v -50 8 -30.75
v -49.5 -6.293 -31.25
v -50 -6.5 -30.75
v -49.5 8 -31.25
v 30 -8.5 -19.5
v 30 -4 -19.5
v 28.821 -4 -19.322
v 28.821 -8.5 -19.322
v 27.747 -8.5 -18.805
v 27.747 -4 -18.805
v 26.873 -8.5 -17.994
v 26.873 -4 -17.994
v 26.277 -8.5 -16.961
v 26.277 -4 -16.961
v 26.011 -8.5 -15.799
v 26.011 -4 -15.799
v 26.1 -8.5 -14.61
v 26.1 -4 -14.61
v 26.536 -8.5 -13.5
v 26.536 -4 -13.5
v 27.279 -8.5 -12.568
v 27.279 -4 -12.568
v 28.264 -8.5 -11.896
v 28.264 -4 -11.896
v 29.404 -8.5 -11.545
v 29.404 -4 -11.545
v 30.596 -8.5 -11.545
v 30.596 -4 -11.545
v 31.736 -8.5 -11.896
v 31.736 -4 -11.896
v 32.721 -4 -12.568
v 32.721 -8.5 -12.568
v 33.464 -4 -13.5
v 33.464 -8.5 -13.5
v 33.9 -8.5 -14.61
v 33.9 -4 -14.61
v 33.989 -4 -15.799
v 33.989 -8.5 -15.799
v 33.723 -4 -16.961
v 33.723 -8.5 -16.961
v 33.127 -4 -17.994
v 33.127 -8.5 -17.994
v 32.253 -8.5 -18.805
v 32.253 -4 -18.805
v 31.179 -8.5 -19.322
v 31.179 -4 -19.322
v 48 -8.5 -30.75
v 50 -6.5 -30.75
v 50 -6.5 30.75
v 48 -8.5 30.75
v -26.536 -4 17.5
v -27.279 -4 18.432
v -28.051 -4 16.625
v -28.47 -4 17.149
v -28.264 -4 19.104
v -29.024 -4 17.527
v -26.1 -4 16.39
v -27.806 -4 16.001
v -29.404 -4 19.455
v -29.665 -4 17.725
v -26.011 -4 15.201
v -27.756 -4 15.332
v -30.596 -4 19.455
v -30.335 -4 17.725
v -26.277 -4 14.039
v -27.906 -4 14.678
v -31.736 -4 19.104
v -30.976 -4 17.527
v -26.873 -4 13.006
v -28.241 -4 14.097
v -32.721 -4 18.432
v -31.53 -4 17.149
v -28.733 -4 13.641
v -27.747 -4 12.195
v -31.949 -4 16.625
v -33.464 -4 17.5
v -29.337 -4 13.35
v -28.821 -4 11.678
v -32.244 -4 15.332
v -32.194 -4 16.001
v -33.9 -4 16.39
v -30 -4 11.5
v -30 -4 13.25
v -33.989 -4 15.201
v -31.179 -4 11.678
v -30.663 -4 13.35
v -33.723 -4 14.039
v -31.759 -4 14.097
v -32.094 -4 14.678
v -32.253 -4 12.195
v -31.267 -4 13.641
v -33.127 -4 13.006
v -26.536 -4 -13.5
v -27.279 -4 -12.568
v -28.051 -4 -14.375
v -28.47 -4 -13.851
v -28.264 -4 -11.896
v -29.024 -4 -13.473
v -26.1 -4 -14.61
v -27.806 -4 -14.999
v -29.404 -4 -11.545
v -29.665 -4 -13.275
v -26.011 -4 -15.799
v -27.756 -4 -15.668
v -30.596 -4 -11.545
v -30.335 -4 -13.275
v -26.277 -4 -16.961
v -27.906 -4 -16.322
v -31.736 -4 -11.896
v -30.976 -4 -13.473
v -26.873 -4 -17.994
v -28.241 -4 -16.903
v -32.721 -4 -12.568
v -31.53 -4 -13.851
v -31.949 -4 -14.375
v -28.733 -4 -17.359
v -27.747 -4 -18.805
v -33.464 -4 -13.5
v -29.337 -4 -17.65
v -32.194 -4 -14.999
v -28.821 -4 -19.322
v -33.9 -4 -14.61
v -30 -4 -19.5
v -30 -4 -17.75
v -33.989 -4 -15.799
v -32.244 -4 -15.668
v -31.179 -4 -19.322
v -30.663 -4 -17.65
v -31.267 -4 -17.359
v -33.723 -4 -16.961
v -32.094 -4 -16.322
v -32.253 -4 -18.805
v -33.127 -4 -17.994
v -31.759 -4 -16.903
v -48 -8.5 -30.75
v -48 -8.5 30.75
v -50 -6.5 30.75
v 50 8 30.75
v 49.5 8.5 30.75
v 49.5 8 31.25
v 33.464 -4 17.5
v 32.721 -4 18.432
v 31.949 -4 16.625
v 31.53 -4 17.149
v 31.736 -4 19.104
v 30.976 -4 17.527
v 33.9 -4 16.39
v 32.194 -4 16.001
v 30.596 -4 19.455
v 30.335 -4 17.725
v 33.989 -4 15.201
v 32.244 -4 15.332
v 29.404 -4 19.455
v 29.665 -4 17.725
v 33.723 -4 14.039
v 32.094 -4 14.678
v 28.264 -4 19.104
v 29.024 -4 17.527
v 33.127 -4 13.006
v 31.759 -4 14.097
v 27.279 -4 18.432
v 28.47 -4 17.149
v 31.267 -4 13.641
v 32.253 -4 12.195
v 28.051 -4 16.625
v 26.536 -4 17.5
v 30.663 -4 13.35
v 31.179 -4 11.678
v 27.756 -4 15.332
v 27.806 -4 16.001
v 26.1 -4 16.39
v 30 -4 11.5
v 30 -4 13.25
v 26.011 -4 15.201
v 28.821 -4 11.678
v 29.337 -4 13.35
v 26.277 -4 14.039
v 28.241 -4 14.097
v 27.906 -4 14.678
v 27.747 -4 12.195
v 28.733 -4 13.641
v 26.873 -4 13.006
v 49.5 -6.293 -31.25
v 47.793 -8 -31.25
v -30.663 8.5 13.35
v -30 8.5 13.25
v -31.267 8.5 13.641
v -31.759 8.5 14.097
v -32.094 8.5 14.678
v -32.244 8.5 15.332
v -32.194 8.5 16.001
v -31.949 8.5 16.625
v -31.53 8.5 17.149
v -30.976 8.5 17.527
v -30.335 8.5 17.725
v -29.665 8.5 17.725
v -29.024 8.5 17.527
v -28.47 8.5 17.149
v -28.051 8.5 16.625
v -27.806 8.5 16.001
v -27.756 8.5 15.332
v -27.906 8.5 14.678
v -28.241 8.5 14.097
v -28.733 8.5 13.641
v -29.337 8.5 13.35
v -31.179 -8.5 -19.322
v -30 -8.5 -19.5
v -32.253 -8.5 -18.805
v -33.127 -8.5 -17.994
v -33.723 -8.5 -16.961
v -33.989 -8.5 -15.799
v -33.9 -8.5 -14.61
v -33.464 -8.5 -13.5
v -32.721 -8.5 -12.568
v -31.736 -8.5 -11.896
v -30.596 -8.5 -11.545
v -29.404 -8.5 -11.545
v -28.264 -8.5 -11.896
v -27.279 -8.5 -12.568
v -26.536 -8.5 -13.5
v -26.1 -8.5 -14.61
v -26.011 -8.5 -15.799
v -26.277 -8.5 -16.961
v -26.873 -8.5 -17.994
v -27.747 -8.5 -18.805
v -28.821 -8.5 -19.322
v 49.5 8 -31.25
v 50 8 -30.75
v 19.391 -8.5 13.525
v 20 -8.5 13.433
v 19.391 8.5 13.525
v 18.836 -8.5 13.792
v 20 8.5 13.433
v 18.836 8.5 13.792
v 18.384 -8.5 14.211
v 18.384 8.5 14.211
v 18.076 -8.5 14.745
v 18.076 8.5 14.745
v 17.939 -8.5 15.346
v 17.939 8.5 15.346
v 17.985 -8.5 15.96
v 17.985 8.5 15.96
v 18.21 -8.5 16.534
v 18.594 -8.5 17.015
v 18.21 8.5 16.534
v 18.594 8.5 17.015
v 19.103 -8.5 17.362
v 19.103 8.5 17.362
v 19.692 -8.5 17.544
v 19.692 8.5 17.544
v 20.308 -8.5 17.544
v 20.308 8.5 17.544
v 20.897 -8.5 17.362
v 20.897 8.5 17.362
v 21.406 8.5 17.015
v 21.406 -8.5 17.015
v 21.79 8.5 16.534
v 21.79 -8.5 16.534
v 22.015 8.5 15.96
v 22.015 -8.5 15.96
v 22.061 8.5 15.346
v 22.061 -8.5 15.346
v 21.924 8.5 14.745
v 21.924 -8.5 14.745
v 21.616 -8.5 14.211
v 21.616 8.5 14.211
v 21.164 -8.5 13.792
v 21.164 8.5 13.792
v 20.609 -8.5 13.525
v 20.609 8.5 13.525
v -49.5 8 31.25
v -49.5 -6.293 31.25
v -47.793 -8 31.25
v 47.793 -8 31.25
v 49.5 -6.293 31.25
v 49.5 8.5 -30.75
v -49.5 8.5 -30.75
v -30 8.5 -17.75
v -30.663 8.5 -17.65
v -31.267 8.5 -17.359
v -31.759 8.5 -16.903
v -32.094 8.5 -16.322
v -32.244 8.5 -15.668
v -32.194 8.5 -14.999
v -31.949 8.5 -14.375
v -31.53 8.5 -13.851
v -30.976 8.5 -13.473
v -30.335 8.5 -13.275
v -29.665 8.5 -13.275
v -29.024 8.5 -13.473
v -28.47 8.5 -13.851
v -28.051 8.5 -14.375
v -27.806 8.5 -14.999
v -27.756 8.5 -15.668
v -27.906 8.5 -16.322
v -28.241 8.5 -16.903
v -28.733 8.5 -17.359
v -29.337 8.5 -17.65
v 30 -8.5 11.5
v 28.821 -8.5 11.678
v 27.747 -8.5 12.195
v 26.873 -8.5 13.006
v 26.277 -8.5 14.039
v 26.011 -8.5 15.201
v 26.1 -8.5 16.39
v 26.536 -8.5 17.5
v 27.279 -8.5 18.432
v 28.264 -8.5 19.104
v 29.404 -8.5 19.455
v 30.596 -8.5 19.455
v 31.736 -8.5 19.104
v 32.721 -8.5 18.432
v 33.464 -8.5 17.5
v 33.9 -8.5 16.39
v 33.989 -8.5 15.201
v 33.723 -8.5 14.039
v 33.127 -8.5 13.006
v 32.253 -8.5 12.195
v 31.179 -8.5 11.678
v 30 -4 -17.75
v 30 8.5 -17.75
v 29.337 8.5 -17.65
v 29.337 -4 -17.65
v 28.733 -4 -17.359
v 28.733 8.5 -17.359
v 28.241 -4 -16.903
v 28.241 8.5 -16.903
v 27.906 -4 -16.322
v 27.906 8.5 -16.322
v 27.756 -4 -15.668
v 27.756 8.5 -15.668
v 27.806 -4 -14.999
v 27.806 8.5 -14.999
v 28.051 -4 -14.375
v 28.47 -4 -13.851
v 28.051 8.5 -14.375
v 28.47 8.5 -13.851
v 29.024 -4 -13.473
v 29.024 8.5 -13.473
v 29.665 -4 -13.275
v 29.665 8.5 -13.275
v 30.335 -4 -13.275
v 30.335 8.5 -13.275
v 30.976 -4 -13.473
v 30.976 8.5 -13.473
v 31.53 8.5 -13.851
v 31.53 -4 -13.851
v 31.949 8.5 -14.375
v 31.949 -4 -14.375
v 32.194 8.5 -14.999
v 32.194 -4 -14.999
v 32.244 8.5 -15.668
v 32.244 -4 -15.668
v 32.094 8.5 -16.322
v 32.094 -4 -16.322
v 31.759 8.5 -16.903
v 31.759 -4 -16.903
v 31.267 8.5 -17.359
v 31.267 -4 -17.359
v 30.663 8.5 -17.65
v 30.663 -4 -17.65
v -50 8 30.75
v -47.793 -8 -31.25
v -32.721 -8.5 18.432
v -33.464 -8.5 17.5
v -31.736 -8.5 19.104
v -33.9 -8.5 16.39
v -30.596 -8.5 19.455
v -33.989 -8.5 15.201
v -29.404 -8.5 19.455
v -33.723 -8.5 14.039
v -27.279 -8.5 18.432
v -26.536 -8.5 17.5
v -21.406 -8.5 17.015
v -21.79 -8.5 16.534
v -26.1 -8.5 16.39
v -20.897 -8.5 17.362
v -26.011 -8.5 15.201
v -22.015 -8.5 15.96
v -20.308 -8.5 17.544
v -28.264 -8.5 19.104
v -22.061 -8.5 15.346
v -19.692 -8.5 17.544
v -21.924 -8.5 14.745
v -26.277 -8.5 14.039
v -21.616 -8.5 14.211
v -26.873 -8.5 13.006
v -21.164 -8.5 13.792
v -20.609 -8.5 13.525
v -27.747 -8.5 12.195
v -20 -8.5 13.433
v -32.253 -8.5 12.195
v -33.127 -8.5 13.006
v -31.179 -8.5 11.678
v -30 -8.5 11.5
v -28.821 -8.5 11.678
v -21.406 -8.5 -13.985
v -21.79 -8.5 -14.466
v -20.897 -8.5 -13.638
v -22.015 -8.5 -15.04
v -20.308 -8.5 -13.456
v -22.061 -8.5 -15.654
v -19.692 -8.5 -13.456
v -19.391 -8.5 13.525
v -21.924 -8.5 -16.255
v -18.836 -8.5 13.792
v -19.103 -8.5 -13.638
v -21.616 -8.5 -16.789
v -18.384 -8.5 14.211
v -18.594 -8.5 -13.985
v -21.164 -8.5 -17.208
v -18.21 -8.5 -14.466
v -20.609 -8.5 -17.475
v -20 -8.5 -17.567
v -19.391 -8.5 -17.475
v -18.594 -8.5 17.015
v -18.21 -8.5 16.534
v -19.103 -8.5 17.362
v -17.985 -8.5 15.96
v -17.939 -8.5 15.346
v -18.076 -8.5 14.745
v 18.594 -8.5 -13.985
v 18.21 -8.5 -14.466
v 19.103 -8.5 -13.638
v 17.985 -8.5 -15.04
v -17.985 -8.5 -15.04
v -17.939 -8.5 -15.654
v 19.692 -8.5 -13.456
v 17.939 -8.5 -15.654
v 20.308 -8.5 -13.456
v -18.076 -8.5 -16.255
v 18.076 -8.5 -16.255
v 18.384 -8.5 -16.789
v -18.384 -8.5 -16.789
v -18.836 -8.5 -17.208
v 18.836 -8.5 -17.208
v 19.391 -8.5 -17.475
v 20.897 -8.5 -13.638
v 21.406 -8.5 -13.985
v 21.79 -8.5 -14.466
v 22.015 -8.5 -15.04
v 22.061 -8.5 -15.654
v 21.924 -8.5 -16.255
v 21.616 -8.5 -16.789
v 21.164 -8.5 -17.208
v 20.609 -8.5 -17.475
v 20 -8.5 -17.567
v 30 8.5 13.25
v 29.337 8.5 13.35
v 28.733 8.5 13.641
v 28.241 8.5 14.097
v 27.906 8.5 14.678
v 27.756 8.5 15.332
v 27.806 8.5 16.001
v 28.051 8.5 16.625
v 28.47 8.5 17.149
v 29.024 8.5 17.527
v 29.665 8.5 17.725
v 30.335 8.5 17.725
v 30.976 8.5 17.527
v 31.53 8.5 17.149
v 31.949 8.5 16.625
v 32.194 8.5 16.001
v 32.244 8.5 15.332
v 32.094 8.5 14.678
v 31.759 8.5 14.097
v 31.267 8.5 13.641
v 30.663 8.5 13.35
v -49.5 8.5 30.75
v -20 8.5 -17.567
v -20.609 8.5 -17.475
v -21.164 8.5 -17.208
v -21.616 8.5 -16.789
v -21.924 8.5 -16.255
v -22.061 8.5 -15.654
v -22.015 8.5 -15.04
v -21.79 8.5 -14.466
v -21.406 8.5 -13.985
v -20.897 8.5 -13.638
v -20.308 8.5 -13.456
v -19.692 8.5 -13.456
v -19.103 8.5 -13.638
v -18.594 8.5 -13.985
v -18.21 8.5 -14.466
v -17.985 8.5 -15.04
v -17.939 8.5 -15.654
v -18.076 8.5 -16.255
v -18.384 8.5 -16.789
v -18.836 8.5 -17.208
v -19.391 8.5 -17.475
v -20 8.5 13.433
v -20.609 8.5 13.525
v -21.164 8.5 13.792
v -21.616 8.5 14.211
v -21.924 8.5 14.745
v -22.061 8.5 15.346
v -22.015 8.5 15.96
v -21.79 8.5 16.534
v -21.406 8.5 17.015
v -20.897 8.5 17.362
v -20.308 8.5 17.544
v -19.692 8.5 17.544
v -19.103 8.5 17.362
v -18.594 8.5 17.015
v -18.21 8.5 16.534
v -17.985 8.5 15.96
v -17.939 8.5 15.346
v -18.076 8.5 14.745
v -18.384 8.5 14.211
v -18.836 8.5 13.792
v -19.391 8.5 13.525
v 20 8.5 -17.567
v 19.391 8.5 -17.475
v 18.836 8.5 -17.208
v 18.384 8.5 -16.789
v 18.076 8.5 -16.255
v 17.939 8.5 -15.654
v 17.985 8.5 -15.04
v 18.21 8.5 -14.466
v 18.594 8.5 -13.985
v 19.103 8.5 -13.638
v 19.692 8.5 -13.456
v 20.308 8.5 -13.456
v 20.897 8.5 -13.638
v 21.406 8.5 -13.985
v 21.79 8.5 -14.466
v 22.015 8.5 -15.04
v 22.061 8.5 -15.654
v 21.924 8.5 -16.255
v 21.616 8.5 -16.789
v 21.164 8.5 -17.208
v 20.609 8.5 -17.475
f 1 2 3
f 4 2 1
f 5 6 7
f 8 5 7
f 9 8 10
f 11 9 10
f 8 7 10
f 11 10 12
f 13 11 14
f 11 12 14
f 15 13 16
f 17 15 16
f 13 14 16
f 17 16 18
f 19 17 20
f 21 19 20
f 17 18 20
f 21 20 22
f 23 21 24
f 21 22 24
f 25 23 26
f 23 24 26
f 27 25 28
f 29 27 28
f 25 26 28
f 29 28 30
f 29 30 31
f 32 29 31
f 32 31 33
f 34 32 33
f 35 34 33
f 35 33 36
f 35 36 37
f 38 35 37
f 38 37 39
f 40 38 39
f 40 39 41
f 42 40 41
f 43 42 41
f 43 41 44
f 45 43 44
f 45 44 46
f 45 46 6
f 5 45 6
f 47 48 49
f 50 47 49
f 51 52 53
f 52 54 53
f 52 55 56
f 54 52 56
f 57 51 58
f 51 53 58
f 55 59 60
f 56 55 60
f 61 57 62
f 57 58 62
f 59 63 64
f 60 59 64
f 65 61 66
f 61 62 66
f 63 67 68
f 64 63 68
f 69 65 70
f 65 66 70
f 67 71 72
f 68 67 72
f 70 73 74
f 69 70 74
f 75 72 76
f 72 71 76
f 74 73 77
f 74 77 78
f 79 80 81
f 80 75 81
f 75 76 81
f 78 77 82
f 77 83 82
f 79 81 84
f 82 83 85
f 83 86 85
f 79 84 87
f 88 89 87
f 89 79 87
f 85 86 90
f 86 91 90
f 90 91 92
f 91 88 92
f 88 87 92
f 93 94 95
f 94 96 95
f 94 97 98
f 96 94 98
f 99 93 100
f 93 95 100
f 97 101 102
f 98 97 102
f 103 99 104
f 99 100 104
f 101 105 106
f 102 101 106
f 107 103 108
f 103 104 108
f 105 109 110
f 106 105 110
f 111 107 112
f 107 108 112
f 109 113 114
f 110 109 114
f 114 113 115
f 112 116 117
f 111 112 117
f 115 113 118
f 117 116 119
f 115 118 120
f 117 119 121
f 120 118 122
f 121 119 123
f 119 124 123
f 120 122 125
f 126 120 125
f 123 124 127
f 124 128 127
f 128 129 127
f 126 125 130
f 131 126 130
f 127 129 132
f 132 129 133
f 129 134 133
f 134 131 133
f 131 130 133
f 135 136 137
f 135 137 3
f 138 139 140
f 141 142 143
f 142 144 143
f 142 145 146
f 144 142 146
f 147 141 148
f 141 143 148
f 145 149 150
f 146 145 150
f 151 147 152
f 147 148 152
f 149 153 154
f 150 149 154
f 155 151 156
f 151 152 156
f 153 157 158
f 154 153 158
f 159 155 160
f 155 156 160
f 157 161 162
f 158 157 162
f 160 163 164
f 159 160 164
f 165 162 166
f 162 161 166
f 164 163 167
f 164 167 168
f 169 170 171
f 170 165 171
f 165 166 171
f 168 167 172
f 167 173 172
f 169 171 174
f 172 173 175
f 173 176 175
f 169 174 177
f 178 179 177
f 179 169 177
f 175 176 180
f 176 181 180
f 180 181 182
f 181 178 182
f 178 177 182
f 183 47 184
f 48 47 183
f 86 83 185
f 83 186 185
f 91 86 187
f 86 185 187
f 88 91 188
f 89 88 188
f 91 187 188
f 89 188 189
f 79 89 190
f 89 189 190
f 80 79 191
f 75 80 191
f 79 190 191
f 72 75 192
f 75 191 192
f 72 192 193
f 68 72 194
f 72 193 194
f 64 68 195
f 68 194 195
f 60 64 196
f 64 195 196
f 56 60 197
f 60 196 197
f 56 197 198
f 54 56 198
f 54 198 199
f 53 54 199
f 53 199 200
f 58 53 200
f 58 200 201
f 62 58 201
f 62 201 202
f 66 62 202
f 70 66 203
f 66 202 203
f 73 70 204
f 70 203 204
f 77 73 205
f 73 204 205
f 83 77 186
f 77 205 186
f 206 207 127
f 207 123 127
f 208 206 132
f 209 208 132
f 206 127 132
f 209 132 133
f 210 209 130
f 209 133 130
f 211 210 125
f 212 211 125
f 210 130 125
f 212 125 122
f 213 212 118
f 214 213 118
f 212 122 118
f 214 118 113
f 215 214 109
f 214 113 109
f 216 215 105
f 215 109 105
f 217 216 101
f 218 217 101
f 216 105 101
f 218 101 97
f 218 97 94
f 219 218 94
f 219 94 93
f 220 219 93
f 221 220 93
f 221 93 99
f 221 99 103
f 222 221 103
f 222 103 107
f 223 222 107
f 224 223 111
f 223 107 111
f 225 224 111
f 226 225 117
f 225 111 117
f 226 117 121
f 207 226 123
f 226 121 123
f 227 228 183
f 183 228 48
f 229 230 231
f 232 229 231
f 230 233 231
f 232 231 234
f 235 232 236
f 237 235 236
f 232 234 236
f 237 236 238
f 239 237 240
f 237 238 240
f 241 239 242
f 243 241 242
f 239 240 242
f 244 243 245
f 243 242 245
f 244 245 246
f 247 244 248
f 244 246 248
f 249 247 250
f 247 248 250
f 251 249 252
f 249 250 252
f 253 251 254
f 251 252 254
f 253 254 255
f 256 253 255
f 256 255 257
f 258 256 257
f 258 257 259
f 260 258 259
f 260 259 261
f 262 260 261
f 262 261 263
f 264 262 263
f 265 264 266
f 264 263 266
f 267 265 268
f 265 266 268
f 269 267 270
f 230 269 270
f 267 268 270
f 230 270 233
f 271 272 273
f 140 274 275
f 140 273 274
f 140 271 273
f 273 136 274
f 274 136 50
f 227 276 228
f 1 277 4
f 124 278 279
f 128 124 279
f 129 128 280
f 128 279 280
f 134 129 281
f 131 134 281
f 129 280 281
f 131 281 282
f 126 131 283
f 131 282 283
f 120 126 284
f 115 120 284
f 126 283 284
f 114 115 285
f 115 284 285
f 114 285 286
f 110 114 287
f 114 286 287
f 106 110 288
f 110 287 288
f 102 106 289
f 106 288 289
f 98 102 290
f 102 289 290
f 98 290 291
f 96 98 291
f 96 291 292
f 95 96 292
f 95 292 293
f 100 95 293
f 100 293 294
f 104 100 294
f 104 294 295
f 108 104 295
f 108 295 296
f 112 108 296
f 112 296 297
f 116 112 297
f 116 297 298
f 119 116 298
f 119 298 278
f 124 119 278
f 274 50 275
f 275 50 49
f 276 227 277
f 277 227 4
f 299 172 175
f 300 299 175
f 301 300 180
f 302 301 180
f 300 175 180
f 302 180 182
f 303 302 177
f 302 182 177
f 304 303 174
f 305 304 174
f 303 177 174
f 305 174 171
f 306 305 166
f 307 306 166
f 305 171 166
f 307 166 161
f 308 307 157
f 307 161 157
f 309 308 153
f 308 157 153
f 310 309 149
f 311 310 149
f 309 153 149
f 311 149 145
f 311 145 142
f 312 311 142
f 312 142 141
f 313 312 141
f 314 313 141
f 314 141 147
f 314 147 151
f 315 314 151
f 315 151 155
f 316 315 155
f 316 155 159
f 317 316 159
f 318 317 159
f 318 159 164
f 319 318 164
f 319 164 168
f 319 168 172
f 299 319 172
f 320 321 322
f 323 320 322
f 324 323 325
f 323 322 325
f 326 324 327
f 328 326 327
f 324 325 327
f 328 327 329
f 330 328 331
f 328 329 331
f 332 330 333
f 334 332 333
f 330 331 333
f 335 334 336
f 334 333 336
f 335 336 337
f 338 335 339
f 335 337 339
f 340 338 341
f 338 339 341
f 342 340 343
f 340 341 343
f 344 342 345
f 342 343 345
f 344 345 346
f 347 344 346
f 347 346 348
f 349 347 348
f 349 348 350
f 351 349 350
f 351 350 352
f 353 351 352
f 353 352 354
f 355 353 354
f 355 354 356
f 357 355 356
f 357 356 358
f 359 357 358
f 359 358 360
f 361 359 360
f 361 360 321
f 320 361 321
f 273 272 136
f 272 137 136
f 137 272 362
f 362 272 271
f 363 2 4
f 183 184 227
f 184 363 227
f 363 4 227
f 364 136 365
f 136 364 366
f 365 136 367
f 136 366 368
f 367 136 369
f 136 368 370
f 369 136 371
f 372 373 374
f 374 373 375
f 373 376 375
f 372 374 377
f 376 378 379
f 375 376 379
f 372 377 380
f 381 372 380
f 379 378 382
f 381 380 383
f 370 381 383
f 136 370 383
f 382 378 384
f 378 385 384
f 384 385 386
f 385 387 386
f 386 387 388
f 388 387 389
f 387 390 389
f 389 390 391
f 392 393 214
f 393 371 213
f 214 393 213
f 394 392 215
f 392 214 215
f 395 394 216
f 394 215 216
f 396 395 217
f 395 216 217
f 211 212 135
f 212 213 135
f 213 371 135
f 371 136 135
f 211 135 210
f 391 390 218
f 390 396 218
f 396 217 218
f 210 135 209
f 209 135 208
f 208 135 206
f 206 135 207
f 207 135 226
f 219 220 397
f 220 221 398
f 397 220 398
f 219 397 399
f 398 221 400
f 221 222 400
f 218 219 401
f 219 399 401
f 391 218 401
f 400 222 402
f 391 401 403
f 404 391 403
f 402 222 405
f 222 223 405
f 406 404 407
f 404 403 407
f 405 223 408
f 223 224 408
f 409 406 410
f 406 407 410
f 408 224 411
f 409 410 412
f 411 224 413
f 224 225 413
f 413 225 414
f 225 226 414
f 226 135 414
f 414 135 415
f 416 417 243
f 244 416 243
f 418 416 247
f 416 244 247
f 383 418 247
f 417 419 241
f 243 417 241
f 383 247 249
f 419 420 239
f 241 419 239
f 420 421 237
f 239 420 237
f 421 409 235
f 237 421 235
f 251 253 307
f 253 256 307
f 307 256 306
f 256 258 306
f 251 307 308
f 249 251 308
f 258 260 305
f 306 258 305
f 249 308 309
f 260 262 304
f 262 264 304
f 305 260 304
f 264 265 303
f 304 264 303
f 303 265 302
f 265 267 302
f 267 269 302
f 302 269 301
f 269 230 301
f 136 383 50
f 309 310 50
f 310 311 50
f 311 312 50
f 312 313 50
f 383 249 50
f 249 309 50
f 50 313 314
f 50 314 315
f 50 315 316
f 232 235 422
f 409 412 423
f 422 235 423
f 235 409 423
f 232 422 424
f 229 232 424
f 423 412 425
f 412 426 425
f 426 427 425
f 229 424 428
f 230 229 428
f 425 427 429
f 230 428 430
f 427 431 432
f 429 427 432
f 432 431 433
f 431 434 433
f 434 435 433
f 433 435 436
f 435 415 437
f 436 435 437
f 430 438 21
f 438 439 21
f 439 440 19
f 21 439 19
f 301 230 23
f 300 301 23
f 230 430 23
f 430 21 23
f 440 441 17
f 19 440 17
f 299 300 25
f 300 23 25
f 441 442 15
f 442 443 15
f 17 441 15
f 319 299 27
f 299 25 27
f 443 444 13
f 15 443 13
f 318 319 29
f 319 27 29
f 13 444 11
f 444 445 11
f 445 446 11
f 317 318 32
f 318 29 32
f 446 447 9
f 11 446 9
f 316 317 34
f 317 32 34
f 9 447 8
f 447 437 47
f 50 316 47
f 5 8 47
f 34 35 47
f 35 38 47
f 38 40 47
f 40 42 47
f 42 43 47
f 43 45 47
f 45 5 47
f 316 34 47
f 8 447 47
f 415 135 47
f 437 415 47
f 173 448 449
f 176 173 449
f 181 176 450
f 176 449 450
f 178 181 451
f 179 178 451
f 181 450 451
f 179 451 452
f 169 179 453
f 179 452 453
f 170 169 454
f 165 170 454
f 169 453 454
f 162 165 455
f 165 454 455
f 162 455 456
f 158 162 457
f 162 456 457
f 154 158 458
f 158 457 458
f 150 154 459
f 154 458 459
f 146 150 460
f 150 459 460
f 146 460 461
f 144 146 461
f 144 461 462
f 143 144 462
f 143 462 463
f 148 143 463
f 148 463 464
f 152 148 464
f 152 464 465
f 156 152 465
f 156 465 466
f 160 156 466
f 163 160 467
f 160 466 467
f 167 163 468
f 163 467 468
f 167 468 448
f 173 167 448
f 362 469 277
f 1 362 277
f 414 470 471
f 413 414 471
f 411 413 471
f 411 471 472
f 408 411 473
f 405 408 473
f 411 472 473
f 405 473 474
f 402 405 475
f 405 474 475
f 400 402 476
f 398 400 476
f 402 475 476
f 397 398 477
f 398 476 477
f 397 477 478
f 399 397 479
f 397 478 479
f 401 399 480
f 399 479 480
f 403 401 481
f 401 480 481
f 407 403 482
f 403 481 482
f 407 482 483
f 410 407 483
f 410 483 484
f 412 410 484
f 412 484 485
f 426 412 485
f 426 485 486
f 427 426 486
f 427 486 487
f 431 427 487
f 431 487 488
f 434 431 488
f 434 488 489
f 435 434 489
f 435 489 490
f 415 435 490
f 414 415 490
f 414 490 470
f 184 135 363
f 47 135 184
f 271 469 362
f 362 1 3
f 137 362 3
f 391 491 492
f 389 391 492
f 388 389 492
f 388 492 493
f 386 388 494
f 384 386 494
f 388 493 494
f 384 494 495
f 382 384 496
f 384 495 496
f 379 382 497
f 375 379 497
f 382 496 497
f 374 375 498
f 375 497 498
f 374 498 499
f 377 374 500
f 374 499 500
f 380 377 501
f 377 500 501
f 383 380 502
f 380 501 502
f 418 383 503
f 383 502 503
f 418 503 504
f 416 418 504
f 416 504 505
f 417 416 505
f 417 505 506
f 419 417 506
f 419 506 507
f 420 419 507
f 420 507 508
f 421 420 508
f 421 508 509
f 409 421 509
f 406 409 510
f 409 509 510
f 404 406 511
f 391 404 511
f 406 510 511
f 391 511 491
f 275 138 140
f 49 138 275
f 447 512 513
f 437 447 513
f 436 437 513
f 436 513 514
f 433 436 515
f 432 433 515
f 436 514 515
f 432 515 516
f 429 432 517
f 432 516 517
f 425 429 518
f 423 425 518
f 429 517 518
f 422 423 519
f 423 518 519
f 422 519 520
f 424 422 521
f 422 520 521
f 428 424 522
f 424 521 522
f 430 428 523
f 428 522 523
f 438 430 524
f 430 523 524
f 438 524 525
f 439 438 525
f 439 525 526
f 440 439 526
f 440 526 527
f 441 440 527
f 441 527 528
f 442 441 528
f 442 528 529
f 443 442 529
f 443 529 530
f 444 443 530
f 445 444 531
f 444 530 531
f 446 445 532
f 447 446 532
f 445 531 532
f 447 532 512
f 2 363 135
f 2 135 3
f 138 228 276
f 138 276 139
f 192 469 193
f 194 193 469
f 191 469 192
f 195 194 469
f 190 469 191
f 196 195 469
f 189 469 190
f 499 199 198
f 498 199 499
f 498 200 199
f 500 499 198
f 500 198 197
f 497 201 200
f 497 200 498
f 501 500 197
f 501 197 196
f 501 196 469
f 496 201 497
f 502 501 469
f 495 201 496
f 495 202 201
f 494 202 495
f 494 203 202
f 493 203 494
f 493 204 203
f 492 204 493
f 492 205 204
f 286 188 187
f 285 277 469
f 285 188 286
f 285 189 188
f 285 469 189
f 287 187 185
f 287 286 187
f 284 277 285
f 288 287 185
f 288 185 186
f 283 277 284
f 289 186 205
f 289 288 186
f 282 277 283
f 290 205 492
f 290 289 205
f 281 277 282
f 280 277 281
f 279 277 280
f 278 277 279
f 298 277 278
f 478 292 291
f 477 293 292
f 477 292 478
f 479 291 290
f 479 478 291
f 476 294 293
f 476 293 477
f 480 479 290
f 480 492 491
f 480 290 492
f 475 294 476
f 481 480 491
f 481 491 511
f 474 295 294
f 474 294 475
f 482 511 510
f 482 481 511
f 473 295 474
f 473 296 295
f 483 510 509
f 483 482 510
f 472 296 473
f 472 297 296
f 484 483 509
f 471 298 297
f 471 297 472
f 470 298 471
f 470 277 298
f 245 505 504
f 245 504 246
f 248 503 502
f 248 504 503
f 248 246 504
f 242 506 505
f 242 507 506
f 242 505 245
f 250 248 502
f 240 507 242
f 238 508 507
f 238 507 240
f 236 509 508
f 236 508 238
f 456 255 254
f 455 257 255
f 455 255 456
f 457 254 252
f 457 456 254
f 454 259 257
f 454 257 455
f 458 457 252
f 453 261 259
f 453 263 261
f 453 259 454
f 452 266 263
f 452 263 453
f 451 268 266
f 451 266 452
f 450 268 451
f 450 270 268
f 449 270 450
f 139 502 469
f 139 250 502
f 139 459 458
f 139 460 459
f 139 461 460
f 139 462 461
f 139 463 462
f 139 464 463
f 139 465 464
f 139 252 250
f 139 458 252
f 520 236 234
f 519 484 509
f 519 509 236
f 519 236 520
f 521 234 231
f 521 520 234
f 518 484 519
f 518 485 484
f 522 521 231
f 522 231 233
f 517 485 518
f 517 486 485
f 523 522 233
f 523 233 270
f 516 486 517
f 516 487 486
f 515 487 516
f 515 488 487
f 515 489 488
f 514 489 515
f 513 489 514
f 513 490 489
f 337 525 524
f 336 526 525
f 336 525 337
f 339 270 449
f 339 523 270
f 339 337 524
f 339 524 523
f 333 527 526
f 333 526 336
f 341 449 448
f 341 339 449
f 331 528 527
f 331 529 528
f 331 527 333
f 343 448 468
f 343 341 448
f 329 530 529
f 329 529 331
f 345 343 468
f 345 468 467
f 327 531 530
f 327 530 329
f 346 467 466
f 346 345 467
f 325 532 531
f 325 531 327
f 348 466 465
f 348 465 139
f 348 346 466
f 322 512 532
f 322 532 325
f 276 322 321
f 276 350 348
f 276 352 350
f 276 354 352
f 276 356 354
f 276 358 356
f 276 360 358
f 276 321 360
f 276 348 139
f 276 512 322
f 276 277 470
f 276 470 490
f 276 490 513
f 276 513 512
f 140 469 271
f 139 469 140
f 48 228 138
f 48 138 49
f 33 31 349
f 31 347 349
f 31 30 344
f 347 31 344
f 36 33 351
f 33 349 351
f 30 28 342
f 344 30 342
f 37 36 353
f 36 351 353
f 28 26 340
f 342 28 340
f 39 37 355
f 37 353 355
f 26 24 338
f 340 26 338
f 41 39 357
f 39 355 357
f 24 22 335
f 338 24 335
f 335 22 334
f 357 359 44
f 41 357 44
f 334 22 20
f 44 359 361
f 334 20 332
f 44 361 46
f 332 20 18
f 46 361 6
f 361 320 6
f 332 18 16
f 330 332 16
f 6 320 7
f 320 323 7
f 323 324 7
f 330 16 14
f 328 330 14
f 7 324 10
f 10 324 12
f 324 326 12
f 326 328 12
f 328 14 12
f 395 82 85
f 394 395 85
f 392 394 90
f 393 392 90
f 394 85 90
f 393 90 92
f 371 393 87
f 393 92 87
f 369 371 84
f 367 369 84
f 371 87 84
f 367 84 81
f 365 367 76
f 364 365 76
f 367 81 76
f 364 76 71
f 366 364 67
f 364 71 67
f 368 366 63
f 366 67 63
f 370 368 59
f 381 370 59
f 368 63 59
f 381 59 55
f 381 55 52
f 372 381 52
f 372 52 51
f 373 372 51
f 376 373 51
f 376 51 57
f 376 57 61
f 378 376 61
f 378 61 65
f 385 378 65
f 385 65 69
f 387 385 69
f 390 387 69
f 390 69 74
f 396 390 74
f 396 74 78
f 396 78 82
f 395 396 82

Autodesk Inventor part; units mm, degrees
ref_plane "YZ Plane" through (0, 0, 0) normal (1, 0, 0) x (0, 1, 0)
ref_plane "XZ Plane" through (0, 0, 0) normal (0, 1, 0) x (-1, 0, 0)
ref_plane "XY Plane" through (0, 0, 0) normal (0, 0, 1) x (1, 0, 0)
sketch "Sketch5" plane through (0, 0, 0) normal (0, 0, 1) x (1, 0, 0)
  line L0 (-50, -8.5) -> (50, -8.5)
  line L1 (50, 8.5) -> (50, -8.5)
  line L2 (-50, 8.5) -> (50, 8.5)
  line L3 (-50, 8.5) -> (-50, -8.5)
  point P0 (0, 0)
  point P1 (0, 8.5)
  point P2 (50, 0)
  dimension "d8" = 100
  dimension "d9" = 17
extrude "Extrusion5" add sketch "Sketch5" along normal mid plane 62.5
chamfer "Chamfer1" distance 2 angle 45 2 edges at (50, -8.5, 0) (-50, -8.5, 0)
sketch "Sketch7" plane through (-48, -8.5, -31.25) normal (0, -1, 0) x (1, 0, 0)
  circle A0 centre (78, 15.75) radius 2.2423
  circle A1 centre (78, 46.75) radius 2.2423
  circle A2 centre (18, 15.75) radius 2.2423
  circle A3 centre (18, 46.75) radius 2.2423
  point P0 (48, 31.25)
  point P1 (96, 0)
  point P2 (96, 62.5)
  dimension "d18" = 60
  dimension "d19" = 30
  dimension "d20" = 31
  dimension "d21" = 15.5
  dimension "d48" = 62.5
hole "Hole1" at (30, -8.5, -15.5) at (30, -8.5, 15.5) at (-30, -8.5, 15.5) at (-30, -8.5, -15.5) direction (0, 1, 0) diameter 4.5 end through all counterbore diameter 8 counterbore depth 4.5 clearance for "Socket Head Cap Screw DIN EN ISO 4762" size "M4" standard "DIN"
sketch "Sketch9" plane through (-48, -8.5, -31.25) normal (0, -1, 0) x (1, 0, 0)
  circle A0 centre (78, 15.75) radius 4 projected
  circle A1 centre (78, 46.75) radius 4 projected
  circle A2 centre (68, 46.75) radius 2.5
  circle A3 centre (68, 15.75) radius 2.5
  line L0 (48, 31.25) -> (48, 8.9232)
  circle A4 centre (28, 46.75) radius 2.5
  circle A5 centre (28, 15.75) radius 2.5
  dimension "d39" = 20
  dimension "d40" = 5
hole "Hole3" at (-20, -8.5, -15.5) at (-20, -8.5, 15.5) at (20, -8.5, 15.5) at (20, -8.5, -15.5) direction (0, 1, 0) diameter 4.134 end through all thread size "M5x0.8" class "6H" standard "ISO Metric profile"
chamfer "Chamfer4" distance 0.5 angle 45 14 edges at (0, 8.5, 31.25) (50, 8.5, 0) (-50, 8.5, 0) (0, 8.5, -31.25) (50, 1, 31.25) (50, 1, -31.25) (-50, 1, -31.25) (-50, 1, 31.25) (0, -8.5, 31.25) (0, -8.5, -31.25) (49, -7.5, 31.25) (-49, -7.5, 31.25) (49, -7.5, -31.25) (-49, -7.5, -31.25)
equation "\"d19\" = 0.5 * d18"
equation "\"d21\" = 0.5 * d20"
properties part number "BC-10022" material "Aço Carbono AISI 1006"
